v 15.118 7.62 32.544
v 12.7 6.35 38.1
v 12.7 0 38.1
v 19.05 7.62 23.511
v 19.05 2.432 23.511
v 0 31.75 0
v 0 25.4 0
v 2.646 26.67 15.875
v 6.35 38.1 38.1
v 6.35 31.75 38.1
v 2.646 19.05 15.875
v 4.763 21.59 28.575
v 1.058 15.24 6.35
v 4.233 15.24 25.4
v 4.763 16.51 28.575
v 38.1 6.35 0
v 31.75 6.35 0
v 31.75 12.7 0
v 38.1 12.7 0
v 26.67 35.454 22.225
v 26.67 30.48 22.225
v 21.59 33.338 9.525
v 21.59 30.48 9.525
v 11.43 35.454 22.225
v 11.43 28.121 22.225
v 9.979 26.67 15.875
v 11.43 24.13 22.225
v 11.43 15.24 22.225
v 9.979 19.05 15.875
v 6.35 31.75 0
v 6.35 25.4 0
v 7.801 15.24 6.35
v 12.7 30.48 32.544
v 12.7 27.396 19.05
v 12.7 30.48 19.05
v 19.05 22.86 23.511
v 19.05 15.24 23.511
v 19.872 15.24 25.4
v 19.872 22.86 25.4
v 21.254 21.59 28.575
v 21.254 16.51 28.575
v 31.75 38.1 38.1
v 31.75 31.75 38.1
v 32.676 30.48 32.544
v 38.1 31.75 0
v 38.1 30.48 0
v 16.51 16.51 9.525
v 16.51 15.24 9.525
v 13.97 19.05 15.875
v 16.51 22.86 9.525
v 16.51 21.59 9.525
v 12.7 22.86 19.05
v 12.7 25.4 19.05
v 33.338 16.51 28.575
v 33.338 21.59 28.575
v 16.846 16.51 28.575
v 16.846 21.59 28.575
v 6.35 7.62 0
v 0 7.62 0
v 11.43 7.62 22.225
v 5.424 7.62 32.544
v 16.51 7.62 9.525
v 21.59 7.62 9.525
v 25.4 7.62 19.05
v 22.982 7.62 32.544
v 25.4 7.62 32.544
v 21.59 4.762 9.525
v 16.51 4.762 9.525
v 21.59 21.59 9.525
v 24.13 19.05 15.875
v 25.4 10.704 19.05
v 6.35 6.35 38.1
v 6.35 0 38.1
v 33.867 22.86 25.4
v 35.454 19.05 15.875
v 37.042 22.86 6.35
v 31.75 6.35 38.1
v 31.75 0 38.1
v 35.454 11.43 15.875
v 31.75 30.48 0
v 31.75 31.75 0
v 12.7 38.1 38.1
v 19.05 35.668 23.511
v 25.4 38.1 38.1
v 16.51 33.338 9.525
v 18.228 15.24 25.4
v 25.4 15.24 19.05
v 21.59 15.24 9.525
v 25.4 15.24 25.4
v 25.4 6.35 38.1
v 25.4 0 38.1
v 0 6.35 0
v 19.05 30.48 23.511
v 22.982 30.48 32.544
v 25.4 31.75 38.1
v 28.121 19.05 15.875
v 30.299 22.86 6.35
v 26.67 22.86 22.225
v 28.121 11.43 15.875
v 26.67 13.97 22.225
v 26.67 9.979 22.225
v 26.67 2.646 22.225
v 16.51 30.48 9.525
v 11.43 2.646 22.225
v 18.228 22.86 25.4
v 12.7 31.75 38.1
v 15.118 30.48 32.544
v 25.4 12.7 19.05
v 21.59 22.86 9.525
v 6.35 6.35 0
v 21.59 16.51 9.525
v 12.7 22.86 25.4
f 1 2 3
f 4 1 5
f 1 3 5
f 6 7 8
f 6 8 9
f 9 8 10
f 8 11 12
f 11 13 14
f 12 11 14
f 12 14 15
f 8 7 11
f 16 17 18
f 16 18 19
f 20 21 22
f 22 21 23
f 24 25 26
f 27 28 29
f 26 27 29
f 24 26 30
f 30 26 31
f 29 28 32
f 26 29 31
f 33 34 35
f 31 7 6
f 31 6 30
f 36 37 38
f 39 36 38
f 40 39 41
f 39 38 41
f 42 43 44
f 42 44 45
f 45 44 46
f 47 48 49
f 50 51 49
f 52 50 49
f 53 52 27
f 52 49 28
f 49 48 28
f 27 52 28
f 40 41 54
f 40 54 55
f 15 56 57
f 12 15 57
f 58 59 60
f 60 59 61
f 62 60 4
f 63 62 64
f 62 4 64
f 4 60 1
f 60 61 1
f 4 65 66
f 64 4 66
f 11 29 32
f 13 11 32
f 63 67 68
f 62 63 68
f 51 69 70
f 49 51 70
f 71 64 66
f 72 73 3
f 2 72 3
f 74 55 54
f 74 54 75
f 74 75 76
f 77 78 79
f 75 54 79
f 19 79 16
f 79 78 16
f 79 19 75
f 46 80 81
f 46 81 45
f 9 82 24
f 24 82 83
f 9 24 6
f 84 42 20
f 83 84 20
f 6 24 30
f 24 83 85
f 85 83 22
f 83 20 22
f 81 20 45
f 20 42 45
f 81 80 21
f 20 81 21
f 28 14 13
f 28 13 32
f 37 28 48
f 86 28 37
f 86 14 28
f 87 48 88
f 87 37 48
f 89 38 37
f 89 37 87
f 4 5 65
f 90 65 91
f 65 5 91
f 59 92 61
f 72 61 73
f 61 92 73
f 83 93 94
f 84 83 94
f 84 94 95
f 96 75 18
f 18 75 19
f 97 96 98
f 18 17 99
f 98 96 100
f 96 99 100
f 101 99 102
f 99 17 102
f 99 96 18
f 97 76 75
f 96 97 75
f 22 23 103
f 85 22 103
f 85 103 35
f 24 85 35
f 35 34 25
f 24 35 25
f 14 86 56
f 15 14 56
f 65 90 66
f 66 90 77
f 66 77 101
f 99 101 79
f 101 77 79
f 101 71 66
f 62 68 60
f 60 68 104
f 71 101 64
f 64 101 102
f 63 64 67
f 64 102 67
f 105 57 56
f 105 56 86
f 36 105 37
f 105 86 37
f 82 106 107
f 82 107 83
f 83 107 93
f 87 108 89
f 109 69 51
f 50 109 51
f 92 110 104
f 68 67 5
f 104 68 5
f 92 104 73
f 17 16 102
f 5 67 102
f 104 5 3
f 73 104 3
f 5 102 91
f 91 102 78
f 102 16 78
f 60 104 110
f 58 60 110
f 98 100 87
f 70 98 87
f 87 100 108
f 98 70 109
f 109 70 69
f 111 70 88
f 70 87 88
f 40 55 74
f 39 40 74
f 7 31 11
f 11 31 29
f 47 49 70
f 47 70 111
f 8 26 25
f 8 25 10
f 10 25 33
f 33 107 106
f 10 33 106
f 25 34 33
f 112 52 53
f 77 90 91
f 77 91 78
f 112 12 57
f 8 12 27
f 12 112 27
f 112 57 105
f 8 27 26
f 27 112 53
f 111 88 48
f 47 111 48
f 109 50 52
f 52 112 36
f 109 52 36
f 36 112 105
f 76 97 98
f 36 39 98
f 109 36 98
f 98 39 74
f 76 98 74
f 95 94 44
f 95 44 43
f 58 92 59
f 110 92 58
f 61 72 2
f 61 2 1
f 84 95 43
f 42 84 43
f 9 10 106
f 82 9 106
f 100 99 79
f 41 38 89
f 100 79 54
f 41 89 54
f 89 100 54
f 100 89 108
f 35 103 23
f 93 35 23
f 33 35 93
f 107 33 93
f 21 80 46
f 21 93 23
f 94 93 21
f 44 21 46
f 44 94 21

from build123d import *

# Parameters (mm, degrees)
F3_W      = 38.1
F3_H      = 38.1
F4_DEPTH  = 38.1
F6_DEPTH  = 38.1
F8_DEPTH  = 38.1
F9_W      = 25.4
F9_H      = 7.62
F10_DEPTH = 38.1


with BuildPart() as f4:
    # F3 (on Front) → F4 (new body)
    with BuildSketch(Plane.XZ):
        with Locations((19.05, 19.05)):
            Rectangle(F3_W, F3_H)
    extrude(amount=-F4_DEPTH)

    # F5 (on offset) → F6 (cut)
    with BuildSketch(Plane.YZ.offset(38.1)):
        Polygon((31.75, 38.1), (6.35, 38.1), (11.43, 15.875), (16.51, 28.575), (21.59, 28.575), (26.67, 15.875), align=None)
        Polygon((0, 38.1), (0, 0), (6.35, 0), align=None)
        Polygon((19.05, 15.875), (12.7, 0), (25.4, 0), align=None)
        Polygon((38.1, 38.1), (31.75, 0), (38.1, 0), align=None)
    extrude(amount=-F6_DEPTH, mode=Mode.SUBTRACT)

    # F7 (on offset) → F8 (cut)
    with BuildSketch(Plane.XZ):
        Polygon((25.4, 38.1), (12.7, 38.1), (19.05, 23.510631), align=None)
        Polygon((6.35, 38.1), (0, 38.1), (0, 0), align=None)
        Polygon((11.43, 22.225), (6.35, 0), (31.75, 0), (26.67, 22.225), (21.59, 9.525), (16.51, 9.525), align=None)
        Polygon((31.75, 38.1), (38.1, 0), (38.1, 38.1), align=None)
    extrude(amount=-F8_DEPTH, mode=Mode.SUBTRACT)

    # F9 (on offset) → F10 (cut)
    with BuildSketch(Plane.XY.offset(38.1)):
        with Locations((25.4, 26.67)):
            Rectangle(F9_W, F9_H)
        with Locations((12.7, 11.43)):
            Rectangle(F9_W, F9_H)
    extrude(amount=-F10_DEPTH, mode=Mode.SUBTRACT)


solid = f4.part
